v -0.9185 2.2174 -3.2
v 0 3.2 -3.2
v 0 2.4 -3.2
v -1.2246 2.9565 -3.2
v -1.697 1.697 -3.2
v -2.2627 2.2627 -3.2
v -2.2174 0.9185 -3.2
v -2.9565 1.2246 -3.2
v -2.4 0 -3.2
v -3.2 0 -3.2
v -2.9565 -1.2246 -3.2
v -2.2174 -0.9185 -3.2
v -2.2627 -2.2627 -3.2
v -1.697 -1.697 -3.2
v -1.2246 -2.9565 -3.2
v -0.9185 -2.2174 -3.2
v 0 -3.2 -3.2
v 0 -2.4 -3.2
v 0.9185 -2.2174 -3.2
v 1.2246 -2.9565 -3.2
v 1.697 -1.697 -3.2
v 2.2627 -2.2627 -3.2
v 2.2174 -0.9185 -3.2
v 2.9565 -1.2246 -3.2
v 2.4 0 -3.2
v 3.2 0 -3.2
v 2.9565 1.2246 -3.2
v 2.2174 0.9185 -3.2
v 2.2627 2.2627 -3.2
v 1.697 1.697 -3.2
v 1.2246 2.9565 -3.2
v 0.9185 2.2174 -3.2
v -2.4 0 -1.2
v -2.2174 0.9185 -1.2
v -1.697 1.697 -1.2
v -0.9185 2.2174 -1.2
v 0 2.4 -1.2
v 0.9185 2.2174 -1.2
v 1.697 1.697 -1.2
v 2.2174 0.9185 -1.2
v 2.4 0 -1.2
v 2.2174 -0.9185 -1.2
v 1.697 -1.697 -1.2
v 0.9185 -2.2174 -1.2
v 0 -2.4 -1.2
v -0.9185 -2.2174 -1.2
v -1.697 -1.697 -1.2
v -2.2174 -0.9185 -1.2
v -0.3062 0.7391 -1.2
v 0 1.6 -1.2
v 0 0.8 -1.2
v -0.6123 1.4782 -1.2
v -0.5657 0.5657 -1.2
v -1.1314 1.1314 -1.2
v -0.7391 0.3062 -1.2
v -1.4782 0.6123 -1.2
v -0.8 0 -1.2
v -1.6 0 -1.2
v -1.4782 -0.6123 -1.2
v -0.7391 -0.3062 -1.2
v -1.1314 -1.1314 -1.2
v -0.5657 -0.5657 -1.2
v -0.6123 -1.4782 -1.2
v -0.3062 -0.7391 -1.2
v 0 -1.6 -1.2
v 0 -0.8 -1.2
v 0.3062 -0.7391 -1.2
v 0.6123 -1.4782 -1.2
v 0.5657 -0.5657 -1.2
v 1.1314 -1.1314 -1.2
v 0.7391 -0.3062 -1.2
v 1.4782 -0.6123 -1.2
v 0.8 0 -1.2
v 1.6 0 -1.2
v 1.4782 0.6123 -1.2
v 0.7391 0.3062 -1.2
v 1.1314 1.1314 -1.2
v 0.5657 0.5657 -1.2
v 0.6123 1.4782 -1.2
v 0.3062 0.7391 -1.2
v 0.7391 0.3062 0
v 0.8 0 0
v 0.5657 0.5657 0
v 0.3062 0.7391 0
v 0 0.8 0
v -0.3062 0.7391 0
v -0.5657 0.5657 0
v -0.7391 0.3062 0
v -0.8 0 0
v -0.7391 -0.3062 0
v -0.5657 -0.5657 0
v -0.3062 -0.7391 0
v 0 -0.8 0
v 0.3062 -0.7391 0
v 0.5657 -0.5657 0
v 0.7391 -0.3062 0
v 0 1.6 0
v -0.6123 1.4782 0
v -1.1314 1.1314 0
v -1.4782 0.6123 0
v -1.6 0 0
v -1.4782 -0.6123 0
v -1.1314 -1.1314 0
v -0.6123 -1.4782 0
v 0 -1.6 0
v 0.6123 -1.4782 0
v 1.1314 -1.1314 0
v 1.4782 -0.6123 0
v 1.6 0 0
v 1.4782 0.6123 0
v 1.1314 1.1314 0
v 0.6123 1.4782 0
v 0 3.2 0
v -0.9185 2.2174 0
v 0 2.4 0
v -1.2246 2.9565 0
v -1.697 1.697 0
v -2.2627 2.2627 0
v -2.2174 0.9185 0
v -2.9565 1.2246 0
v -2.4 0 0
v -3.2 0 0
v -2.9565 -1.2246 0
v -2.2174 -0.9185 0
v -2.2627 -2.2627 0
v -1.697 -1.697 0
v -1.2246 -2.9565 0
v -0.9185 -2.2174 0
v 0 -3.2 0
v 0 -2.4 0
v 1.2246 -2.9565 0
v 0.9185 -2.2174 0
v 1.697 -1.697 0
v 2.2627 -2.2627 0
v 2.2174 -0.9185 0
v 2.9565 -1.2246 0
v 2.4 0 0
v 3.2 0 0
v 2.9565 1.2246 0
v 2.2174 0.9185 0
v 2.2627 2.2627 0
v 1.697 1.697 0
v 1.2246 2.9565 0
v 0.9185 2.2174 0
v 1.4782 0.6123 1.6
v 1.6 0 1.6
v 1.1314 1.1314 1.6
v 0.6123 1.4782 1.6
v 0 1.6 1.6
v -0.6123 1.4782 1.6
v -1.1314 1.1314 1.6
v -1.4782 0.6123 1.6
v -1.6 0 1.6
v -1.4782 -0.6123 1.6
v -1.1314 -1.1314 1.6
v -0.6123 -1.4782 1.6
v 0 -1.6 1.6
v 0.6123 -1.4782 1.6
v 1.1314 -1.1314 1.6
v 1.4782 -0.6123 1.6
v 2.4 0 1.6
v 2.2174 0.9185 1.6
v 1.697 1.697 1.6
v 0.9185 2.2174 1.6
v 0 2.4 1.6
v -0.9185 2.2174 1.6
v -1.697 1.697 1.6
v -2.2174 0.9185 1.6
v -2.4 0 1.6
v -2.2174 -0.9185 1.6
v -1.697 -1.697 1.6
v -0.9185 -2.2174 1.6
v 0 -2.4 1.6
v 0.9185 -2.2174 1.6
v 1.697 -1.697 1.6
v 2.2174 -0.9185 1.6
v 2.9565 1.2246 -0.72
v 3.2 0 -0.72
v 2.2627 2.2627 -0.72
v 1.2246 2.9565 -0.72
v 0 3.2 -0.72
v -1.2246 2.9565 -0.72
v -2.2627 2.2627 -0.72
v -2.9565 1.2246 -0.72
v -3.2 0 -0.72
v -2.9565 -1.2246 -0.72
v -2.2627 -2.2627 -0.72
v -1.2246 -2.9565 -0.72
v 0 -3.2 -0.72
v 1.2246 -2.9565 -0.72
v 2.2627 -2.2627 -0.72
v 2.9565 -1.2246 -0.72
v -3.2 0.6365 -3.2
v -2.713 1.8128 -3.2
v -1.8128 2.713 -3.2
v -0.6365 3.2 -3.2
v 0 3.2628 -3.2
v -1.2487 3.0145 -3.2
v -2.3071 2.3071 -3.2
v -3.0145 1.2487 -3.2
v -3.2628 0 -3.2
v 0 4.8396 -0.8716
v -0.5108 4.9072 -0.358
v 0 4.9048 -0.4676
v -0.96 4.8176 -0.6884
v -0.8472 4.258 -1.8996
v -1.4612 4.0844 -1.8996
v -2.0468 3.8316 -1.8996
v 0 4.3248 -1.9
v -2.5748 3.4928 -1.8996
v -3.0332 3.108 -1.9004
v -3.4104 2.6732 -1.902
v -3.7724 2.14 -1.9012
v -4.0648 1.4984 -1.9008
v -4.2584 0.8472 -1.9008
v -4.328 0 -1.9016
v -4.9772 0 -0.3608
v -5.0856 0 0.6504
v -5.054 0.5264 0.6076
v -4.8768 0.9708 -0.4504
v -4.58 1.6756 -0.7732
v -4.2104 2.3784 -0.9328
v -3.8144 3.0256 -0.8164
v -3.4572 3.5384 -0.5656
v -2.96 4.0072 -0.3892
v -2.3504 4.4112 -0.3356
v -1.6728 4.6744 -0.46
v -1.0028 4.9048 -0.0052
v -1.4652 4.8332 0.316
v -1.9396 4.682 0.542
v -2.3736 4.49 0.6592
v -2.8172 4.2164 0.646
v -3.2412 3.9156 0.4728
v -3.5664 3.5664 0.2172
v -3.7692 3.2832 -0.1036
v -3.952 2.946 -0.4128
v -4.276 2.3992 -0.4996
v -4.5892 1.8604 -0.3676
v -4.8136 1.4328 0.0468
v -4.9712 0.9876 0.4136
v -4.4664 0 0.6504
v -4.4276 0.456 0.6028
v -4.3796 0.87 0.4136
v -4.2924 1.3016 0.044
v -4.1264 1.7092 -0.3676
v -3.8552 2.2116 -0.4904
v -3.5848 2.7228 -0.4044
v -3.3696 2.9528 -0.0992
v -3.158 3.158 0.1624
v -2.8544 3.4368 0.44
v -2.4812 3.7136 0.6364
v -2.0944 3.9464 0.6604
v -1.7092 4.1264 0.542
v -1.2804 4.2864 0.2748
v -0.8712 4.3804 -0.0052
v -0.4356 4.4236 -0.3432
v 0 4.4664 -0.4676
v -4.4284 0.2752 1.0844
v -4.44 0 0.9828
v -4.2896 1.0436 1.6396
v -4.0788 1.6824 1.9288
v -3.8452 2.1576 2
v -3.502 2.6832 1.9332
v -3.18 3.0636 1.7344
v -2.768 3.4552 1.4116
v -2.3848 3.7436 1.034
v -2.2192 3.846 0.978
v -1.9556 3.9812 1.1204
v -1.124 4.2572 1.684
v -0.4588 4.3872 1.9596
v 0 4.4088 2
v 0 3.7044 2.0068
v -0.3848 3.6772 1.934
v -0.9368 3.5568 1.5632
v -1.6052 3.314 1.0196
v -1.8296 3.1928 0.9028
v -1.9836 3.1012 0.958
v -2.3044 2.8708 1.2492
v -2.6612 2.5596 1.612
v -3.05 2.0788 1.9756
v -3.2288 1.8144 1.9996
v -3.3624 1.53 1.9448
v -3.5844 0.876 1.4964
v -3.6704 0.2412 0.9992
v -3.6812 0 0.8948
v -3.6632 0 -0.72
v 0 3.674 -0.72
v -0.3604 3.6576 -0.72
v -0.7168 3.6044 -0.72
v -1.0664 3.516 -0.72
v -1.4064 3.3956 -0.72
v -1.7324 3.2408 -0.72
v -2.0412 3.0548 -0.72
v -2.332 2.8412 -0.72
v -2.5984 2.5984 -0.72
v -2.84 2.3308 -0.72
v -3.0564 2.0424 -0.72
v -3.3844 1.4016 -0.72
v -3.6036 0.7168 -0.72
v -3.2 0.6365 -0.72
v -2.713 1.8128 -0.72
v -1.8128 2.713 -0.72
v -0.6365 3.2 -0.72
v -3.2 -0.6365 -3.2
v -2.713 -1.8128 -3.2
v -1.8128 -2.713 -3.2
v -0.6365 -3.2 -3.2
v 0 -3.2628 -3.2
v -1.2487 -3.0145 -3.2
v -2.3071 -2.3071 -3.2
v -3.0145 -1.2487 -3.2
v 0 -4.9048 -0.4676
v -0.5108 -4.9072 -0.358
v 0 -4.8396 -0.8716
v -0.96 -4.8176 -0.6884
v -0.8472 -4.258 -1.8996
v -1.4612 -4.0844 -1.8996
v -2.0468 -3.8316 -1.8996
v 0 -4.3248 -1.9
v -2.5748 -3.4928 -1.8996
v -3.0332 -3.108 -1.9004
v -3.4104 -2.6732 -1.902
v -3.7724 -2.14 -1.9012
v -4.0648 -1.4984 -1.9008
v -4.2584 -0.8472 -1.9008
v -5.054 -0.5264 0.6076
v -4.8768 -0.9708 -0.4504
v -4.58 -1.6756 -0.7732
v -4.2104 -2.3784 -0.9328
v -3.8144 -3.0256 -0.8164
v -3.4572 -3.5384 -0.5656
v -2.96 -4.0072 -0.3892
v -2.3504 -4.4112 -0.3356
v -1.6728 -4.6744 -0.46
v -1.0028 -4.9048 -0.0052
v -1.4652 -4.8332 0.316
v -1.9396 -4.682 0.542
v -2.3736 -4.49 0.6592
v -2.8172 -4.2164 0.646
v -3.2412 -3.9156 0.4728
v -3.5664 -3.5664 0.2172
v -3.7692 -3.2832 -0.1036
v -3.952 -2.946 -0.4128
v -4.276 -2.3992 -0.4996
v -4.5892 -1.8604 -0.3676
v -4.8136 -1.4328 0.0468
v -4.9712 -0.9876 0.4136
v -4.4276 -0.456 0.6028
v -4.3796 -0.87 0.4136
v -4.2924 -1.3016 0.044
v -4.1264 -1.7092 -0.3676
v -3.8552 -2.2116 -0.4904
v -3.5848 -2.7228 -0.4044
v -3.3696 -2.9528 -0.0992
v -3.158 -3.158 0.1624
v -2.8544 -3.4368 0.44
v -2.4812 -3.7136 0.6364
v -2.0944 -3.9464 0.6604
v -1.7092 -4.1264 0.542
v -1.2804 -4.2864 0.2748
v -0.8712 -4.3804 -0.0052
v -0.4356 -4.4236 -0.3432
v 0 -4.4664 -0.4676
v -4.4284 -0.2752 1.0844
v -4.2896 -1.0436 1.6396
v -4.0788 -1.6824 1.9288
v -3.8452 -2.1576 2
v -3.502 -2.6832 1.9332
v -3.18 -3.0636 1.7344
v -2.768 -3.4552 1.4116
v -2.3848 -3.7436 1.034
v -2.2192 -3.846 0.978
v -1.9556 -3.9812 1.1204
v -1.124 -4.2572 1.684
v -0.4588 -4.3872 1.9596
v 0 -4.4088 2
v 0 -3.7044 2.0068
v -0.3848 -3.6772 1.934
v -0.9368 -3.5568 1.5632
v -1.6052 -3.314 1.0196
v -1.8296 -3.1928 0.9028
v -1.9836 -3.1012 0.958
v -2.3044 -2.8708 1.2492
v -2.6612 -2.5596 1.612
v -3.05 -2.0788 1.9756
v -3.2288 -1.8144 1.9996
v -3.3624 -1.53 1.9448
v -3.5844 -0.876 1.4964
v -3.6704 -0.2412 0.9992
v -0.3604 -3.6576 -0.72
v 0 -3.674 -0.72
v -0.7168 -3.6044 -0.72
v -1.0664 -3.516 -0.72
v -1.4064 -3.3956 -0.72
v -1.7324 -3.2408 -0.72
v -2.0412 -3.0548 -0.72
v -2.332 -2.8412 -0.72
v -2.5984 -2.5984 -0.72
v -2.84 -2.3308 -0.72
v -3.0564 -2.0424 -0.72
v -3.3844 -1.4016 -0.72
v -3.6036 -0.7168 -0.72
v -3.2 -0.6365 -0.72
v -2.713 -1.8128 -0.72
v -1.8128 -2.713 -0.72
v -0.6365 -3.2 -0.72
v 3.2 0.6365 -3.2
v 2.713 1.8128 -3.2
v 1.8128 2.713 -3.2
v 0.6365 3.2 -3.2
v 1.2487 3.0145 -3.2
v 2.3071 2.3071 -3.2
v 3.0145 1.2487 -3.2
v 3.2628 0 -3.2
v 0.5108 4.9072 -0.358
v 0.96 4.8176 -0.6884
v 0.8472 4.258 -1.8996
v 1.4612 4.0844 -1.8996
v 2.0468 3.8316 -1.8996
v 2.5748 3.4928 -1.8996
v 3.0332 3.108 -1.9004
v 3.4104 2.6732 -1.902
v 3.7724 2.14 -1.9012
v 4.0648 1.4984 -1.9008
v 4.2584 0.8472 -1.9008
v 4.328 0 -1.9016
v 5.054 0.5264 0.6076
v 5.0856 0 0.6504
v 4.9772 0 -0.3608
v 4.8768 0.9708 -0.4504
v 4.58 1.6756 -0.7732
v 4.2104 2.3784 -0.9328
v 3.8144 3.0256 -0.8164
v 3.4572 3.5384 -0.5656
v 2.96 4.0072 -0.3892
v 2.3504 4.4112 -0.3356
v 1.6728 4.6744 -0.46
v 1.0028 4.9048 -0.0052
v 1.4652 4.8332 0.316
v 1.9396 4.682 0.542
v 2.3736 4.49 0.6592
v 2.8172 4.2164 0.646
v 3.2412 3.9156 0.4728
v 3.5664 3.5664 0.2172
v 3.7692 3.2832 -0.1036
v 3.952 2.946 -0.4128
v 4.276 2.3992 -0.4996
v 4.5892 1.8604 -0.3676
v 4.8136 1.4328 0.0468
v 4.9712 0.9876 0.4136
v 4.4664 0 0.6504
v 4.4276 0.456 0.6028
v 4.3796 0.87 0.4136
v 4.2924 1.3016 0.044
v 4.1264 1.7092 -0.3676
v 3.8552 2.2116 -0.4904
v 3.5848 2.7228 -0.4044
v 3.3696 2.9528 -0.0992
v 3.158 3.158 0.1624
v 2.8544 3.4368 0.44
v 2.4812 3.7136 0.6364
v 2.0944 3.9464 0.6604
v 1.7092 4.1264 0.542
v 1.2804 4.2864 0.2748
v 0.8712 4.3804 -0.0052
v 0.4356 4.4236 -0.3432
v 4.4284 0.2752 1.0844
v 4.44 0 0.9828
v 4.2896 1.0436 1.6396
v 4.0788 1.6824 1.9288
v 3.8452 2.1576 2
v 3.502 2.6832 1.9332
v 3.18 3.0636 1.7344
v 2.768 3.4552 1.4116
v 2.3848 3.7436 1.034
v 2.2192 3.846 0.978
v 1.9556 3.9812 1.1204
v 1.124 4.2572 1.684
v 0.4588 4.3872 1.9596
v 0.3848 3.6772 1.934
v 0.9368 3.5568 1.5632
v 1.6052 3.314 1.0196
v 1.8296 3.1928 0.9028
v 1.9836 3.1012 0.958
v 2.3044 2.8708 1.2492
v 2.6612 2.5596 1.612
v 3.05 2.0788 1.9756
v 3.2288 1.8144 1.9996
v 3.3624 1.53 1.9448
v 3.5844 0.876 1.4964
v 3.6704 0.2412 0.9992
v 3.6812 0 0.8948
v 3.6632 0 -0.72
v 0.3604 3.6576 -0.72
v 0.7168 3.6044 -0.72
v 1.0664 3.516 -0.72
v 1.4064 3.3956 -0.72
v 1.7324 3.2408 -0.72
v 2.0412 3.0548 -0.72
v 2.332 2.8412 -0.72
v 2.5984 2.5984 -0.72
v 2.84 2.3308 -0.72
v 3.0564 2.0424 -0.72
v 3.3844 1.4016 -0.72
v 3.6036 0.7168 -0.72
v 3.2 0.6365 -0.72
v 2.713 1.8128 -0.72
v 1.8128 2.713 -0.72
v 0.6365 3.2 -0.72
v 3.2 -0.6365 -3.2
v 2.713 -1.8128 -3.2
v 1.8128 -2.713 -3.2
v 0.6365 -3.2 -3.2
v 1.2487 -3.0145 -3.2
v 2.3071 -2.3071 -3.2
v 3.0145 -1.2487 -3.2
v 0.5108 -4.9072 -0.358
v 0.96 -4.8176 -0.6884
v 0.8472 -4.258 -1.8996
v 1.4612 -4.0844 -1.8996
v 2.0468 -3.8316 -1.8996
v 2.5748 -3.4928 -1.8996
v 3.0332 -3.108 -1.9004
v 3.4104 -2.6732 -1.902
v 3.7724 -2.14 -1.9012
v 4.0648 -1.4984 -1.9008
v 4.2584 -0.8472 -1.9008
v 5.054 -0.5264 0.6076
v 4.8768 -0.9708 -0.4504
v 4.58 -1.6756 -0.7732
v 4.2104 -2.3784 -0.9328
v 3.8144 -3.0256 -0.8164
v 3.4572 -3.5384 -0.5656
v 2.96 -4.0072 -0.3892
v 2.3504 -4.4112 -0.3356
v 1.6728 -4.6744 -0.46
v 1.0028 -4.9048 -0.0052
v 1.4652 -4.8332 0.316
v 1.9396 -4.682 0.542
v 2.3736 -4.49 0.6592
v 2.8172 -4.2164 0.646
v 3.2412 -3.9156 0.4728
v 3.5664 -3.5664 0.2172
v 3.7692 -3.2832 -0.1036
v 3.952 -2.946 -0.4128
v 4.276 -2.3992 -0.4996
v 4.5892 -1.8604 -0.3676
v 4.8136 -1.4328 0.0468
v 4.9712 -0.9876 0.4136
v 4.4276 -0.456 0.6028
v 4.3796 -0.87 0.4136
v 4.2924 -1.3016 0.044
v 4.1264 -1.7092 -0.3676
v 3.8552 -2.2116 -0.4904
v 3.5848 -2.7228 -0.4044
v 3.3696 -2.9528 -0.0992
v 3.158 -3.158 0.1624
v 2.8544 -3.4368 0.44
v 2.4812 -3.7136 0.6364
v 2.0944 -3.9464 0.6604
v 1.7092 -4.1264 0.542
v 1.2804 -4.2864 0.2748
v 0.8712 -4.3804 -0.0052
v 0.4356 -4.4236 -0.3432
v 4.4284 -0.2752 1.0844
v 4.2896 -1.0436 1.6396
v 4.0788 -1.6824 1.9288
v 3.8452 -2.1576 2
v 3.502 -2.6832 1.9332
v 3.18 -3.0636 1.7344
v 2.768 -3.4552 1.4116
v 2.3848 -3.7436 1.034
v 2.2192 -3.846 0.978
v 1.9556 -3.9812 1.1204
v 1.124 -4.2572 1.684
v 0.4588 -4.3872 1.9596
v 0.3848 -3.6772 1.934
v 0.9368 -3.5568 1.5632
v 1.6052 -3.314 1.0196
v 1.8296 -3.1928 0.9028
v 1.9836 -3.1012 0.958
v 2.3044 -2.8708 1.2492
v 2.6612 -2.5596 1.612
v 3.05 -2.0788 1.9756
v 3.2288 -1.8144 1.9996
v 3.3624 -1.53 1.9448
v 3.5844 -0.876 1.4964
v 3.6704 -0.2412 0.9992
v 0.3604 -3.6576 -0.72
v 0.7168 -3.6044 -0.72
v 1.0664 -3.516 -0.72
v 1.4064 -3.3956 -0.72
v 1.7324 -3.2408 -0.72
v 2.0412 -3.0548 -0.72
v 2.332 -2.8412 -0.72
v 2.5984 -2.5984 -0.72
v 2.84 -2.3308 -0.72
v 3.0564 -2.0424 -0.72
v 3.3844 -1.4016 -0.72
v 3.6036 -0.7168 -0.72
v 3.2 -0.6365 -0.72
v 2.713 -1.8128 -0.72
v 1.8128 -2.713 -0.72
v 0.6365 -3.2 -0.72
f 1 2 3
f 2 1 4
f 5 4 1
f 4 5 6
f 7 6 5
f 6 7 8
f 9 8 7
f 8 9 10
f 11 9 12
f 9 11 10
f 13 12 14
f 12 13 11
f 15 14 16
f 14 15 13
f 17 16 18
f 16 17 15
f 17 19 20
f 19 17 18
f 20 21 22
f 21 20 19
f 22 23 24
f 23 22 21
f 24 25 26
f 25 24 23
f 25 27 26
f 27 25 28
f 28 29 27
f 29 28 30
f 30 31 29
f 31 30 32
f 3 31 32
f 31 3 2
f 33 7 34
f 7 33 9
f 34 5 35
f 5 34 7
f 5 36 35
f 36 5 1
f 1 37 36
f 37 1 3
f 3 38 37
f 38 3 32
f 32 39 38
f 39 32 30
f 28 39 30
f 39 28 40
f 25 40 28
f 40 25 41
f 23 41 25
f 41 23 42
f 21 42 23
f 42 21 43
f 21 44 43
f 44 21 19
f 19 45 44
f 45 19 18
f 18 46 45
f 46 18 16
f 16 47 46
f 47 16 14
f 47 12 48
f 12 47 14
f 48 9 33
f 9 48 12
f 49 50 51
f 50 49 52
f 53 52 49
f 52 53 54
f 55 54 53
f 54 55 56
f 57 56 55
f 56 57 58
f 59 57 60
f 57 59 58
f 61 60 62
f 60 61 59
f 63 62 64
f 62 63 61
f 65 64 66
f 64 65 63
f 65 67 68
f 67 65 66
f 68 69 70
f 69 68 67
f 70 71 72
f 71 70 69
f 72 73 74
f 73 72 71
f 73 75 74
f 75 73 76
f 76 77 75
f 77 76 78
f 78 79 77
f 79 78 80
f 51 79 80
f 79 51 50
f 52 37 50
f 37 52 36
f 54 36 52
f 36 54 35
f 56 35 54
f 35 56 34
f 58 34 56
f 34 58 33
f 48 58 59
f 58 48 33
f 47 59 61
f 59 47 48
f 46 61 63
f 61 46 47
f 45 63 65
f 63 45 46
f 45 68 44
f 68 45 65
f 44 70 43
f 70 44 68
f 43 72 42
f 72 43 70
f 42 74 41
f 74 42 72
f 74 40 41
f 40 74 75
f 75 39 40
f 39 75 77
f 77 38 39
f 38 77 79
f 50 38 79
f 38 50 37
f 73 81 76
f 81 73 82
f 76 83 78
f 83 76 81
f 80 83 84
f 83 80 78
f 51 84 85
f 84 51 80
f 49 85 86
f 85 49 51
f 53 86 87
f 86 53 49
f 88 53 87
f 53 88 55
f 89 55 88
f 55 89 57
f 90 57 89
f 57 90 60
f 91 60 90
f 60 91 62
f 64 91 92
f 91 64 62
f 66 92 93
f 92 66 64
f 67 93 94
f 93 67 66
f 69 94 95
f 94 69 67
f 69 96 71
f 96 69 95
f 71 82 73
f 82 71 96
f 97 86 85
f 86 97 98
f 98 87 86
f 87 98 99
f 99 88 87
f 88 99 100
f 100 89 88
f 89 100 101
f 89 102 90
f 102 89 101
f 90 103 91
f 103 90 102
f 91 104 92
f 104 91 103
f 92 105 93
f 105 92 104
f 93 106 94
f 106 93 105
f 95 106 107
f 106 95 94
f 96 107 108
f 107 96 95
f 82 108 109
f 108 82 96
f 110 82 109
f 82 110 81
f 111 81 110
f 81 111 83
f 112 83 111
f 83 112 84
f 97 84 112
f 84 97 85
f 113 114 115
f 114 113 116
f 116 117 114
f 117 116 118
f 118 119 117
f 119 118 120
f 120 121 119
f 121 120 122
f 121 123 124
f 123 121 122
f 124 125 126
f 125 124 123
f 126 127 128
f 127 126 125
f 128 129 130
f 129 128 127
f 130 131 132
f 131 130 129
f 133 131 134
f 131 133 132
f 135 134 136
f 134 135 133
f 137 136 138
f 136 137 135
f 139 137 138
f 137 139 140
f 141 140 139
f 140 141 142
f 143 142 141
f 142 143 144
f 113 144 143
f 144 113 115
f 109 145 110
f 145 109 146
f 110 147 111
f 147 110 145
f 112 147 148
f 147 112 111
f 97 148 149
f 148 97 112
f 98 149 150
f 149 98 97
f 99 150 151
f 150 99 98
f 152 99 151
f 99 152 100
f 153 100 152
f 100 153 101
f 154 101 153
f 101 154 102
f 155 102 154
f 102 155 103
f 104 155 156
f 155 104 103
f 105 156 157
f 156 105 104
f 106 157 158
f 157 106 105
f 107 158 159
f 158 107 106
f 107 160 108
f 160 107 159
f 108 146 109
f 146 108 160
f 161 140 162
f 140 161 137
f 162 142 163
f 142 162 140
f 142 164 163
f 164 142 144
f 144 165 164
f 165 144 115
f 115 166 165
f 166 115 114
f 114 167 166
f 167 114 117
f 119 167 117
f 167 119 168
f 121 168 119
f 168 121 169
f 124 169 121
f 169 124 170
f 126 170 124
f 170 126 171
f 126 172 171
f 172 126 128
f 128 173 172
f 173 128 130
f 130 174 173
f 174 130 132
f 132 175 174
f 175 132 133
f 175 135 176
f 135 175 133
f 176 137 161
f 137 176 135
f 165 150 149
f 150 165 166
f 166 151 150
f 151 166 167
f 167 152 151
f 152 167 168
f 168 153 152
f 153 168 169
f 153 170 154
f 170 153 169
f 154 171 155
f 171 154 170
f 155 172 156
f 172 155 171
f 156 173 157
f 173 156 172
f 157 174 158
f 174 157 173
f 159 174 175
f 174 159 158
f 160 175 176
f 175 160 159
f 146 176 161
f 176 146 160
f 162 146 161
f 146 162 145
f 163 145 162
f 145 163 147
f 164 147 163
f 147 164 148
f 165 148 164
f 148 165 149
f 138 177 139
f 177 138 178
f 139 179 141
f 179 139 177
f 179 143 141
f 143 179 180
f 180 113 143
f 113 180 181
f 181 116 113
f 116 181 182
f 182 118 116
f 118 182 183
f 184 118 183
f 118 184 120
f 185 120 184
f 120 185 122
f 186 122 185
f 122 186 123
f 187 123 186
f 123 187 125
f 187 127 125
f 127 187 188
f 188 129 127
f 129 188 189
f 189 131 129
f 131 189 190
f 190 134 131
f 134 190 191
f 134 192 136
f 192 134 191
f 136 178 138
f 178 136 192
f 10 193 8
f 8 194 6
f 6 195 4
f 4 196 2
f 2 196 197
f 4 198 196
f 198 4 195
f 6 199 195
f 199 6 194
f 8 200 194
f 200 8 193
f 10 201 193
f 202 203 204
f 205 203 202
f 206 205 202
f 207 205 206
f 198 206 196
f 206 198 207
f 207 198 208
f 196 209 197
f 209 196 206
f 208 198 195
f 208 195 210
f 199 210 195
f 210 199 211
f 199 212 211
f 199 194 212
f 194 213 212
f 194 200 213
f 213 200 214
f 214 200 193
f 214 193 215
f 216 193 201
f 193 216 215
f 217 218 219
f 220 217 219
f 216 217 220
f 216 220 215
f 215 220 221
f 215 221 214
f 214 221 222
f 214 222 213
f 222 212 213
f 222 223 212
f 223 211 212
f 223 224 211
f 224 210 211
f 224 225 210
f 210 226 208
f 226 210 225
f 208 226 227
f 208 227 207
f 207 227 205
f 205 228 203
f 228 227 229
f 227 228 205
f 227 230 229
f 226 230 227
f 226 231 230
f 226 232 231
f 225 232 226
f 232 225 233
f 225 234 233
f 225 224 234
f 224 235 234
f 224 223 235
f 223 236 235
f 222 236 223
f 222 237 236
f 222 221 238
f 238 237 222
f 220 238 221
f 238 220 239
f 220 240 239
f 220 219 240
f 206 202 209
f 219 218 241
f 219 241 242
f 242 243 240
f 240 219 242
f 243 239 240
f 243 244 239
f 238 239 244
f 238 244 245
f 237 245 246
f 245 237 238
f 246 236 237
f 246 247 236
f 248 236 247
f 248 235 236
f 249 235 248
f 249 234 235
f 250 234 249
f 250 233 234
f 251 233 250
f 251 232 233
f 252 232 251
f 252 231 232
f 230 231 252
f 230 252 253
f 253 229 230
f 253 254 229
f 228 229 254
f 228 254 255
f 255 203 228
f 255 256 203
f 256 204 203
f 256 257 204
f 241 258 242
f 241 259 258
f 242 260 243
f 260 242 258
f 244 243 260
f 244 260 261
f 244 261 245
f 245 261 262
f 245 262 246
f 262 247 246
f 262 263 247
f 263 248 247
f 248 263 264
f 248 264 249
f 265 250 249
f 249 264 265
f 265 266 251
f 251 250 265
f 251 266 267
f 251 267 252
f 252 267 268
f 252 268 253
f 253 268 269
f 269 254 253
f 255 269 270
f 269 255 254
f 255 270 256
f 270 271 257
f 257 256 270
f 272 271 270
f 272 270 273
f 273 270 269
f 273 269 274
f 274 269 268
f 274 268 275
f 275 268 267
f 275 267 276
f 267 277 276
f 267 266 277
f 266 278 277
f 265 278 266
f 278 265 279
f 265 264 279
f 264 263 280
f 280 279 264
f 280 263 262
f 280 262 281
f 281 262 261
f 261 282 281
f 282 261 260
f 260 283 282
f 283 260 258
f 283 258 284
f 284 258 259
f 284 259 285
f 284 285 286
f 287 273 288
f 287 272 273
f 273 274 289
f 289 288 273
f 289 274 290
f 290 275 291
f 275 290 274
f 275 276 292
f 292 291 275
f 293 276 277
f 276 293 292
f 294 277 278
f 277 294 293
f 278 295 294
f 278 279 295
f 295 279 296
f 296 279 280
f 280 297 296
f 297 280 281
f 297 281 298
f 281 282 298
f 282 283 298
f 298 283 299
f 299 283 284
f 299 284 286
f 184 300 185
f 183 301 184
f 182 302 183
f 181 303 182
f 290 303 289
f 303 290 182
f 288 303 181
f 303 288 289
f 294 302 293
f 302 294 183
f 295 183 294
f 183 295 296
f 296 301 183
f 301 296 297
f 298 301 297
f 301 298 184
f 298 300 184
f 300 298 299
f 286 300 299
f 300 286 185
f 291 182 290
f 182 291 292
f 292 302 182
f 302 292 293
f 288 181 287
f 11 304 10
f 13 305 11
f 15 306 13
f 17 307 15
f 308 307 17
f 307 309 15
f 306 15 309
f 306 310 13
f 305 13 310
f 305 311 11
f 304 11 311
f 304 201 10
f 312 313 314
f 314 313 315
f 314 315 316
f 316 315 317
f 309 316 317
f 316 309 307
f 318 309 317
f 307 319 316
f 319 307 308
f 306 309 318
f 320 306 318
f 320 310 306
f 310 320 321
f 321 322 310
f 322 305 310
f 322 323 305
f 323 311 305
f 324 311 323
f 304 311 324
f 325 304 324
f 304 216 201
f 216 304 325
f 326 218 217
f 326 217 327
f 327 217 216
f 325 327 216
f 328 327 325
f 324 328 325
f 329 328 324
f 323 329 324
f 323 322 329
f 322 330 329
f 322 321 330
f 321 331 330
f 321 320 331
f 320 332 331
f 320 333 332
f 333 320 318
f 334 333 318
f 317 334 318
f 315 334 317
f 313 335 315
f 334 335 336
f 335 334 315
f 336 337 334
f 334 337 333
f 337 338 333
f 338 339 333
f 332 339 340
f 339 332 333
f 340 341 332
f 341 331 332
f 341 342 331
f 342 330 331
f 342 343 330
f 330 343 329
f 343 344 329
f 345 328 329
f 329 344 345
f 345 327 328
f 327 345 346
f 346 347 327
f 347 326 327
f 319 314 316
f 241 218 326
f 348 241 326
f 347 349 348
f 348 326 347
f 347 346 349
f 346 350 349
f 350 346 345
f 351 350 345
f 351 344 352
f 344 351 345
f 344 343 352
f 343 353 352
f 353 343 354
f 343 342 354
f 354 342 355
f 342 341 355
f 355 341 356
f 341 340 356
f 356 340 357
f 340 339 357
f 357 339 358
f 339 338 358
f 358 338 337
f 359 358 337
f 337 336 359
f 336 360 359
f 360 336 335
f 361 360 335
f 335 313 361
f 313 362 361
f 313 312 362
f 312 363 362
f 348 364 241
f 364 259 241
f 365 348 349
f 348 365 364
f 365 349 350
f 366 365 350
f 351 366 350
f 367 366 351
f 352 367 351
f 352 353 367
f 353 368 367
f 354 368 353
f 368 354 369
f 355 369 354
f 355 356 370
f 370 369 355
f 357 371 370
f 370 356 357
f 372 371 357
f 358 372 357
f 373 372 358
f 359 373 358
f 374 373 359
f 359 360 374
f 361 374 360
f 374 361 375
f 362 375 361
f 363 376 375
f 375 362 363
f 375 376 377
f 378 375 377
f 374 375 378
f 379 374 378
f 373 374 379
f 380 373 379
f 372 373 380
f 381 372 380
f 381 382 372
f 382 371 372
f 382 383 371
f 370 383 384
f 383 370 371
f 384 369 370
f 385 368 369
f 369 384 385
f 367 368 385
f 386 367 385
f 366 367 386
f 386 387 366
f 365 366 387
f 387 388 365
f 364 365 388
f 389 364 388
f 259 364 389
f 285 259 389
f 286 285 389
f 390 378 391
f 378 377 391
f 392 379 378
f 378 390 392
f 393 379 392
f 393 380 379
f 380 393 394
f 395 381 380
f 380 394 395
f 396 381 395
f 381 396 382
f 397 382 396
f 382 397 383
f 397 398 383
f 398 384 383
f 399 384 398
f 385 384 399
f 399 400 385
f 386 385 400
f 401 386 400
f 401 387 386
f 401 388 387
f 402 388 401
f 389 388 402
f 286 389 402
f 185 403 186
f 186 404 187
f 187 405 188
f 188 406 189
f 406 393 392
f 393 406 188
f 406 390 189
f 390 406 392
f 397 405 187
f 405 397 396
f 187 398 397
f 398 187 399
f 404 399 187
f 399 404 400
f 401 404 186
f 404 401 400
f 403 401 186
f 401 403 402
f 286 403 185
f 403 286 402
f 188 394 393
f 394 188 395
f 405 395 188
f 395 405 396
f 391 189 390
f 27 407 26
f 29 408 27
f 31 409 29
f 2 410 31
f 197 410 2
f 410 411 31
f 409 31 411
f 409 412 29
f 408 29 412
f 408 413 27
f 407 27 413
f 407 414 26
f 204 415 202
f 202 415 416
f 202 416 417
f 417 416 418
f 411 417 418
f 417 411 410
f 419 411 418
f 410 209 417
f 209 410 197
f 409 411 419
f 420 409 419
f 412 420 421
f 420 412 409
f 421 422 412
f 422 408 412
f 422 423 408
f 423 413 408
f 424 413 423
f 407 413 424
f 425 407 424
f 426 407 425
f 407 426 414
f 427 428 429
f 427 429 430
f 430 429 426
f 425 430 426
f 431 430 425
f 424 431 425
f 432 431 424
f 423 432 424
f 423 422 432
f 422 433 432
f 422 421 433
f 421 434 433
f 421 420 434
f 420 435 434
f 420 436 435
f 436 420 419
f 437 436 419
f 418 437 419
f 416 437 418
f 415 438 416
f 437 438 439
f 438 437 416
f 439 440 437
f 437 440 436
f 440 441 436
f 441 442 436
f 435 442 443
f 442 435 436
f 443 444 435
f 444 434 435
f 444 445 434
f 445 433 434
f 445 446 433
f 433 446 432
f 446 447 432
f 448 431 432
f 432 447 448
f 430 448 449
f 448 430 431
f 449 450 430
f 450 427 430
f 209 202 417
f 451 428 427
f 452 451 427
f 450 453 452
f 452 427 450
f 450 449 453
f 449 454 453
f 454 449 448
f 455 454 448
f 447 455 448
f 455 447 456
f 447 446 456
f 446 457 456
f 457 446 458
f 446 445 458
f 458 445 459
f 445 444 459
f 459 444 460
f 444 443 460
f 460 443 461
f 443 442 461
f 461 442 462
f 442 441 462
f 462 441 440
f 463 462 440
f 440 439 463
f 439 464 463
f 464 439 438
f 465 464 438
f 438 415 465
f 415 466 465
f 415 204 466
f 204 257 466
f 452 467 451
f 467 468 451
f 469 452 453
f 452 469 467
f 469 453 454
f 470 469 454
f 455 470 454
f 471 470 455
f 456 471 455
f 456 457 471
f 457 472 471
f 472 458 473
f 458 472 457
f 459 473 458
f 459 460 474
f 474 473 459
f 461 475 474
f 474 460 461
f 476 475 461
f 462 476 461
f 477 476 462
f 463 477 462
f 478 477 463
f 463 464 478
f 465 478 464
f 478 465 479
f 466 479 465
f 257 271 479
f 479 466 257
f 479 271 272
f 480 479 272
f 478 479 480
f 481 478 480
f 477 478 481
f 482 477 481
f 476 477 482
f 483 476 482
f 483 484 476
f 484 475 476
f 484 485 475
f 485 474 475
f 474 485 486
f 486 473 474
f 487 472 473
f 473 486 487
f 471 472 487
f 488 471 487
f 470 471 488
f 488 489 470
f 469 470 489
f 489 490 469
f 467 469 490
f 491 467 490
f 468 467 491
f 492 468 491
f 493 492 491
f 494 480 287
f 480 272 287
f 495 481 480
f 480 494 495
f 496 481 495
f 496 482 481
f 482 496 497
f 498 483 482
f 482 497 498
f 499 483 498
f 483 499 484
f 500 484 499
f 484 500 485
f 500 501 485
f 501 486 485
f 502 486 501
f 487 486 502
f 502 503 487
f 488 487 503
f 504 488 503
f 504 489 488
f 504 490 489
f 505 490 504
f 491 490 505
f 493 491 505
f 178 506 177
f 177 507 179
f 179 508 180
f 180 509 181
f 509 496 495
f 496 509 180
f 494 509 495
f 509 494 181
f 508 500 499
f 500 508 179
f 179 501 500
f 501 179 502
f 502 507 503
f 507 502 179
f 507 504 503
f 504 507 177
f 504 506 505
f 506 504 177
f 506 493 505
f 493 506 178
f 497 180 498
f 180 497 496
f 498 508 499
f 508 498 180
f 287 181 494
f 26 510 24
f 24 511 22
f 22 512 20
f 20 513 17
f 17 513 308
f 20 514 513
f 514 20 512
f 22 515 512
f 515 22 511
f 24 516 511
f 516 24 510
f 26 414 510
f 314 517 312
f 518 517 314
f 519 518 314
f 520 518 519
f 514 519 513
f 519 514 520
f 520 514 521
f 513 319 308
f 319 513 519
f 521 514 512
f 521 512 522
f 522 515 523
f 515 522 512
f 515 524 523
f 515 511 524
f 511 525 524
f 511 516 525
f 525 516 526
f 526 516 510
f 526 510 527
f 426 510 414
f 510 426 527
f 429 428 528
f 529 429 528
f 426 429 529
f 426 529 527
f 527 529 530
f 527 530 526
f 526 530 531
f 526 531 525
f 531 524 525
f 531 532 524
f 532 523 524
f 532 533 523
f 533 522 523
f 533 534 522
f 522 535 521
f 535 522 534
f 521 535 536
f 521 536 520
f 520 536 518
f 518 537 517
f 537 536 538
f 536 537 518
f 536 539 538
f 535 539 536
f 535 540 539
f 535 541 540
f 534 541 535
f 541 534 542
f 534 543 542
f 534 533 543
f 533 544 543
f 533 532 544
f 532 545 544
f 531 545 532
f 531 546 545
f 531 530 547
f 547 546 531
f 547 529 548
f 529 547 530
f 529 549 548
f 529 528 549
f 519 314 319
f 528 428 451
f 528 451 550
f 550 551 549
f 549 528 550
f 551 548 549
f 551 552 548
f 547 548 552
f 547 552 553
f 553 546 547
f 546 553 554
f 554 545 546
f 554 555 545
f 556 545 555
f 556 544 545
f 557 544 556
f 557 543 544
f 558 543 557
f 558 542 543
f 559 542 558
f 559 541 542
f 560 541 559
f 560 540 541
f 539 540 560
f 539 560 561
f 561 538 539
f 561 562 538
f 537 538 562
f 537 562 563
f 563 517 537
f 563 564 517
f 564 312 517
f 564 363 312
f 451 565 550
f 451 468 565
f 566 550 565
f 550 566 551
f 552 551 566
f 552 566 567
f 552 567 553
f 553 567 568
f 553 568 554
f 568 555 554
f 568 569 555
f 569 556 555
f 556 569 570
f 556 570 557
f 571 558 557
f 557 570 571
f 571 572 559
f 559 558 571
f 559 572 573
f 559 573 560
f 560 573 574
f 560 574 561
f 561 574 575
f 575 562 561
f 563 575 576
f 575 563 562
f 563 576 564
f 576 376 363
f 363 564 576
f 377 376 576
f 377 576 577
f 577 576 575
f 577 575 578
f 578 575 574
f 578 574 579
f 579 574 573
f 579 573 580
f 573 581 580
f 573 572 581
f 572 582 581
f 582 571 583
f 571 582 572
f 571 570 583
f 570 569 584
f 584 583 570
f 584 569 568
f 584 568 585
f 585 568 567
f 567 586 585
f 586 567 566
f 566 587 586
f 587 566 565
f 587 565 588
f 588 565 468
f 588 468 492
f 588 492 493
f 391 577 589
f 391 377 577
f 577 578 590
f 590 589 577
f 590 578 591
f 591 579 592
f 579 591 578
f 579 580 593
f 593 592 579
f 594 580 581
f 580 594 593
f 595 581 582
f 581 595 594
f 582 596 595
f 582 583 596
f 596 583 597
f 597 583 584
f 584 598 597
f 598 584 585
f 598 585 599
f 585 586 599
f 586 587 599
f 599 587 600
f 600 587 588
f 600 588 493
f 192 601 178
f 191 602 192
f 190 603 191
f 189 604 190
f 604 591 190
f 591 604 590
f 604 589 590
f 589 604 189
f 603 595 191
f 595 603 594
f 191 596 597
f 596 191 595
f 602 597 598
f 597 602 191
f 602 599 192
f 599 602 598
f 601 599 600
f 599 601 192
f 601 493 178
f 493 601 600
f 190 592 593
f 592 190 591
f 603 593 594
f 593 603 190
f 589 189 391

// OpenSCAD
use <../lib.scad>
use <../p/4-4cylo.scad>
use <../p/4-4edge.scad>
use <../p/4-4ring1.scad>
use <../p/4-4ring2.scad>
use <../p/4-4ring3.scad>
use <s/5904s01.scad>
use <../p/stud2a.scad>
use <../p/stud4od.scad>
function ldraw_lib__5904() = [
// 0 Plate  1 x  1 with 12 Petals
// 0 Name: 5904.dat
// 0 Author: Gerald Lasser [GeraldLasser]
// 0 !LDRAW_ORG Part UPDATE 2024-09
// 0 !LICENSE Licensed under CC BY 4.0 : see CAreadme.txt
// 
// 0 BFC CERTIFY CCW
  [0,"BFC","CERTIFY"],
  [0,"BFC","CCW"],
// 
// 0 !KEYWORDS Botanical, Flower, Plant, Rose
// 
// 0 !HISTORY 2024-10-01 {LEGO Instructions App} Original part shape
// 0 !HISTORY 2024-10-01 [GeraldLasser] File preparation for LDraw Parts Tracker
// 0 !HISTORY 2024-10-27 [OrionP] Official Update 2024-09
// 
// 1 16 0 3 0 1 0 0 0 -1.25 0 0 0 1 stud4od.dat
  [1,16,0,3,0,1,0,0,0,-1.25,0,0,0,1, ldraw_lib__stud4od()],
// 1 16 0 3 0 2 0 0 0 -1 0 0 0 2 4-4ring1.dat
  [1,16,0,3,0,2,0,0,0,-1,0,0,0,2, ldraw_lib__4_4ring1()],
// 1 16 0 3 0 2 0 0 0 -1 0 0 0 2 4-4ring2.dat
  [1,16,0,3,0,2,0,0,0,-1,0,0,0,2, ldraw_lib__4_4ring2()],
// 0 BFC INVERTNEXT
  [0,"BFC","INVERTNEXT"],
// 1 16 0 3 0 2 0 0 0 -3 0 0 0 2 4-4cylo.dat
  [1,16,0,3,0,2,0,0,0,-3,0,0,0,2, ldraw_lib__4_4cylo()],
// 1 16 0 0 0 2 0 0 0 1 0 0 0 2 4-4ring1.dat
  [1,16,0,0,0,2,0,0,0,1,0,0,0,2, ldraw_lib__4_4ring1()],
// 1 16 0 0 0 4 0 0 0 1 0 0 0 4 4-4edge.dat
  [1,16,0,0,0,4,0,0,0,1,0,0,0,4, ldraw_lib__4_4edge()],
// 1 16 0 0 0 6 0 0 0 1 0 0 0 6 4-4edge.dat
  [1,16,0,0,0,6,0,0,0,1,0,0,0,6, ldraw_lib__4_4edge()],
// 1 16 0 0 0 2 0 0 0 1 0 0 0 2 4-4ring3.dat
  [1,16,0,0,0,2,0,0,0,1,0,0,0,2, ldraw_lib__4_4ring3()],
// 1 16 0 0 0 1 0 0 0 1 0 0 0 1 stud2a.dat
  [1,16,0,0,0,1,0,0,0,1,0,0,0,1, ldraw_lib__stud2a()],
// 1 16 0 0 0 8 0 0 0 1.8 0 0 0 8 4-4cylo.dat
  [1,16,0,0,0,8,0,0,0,1.8,0,0,0,8, ldraw_lib__4_4cylo()],
// 
// 1 16 0 0 0 1 0 0 0 1 0 0 0 1 s\5904s01.dat
  [1,16,0,0,0,1,0,0,0,1,0,0,0,1, ldraw_lib__s__5904s01()],
// 1 16 0 0 0 1 0 0 0 1 0 0 0 -1 s\5904s01.dat
  [1,16,0,0,0,1,0,0,0,1,0,0,0,-1, ldraw_lib__s__5904s01()],
// 1 16 0 0 0 -1 0 0 0 1 0 0 0 1 s\5904s01.dat
  [1,16,0,0,0,-1,0,0,0,1,0,0,0,1, ldraw_lib__s__5904s01()],
// 1 16 0 0 0 -1 0 0 0 1 0 0 0 -1 s\5904s01.dat
  [1,16,0,0,0,-1,0,0,0,1,0,0,0,-1, ldraw_lib__s__5904s01()],
// 
// 5 24 -9.203 -2.237 0 -9.158 1.8 0 -9.176 -2.498 .603 -9.176 -2.498 -.603
  [5,24,-9.203,-2.237,0,-9.158,1.8,0,-9.176,-2.498,.603,-9.176,-2.498,-.603],
// 5 24 0 2.179 -12.099 0 4.75 -10.812 2.118 4.749 -10.645 -2.118 4.749 -10.645
  [5,24,0,2.179,-12.099,0,4.75,-10.812,2.118,4.749,-10.645,-2.118,4.749,-10.645],
// 5 24 0 2.179 12.099 0 4.75 10.812 2.118 4.749 10.645 -2.118 4.749 10.645
  [5,24,0,2.179,12.099,0,4.75,10.812,2.118,4.749,10.645,-2.118,4.749,10.645],
// 5 24 10.82 4.754 0 12.443 .902 0 12.192 1.126 -2.427 12.192 1.126 2.427
  [5,24,10.82,4.754,0,12.443,.902,0,12.192,1.126,-2.427,12.192,1.126,2.427],
// 5 24 12.714 -1.626 0 11.166 -1.626 0 12.635 -1.519 -1.316 12.635 -1.519 1.316
  [5,24,12.714,-1.626,0,11.166,-1.626,0,12.635,-1.519,-1.316,12.635,-1.519,1.316],
// 5 24 9.203 -2.237 0 9.158 1.8 0 9.176 -2.498 .603 9.176 -2.498 -.603
  [5,24,9.203,-2.237,0,9.158,1.8,0,9.176,-2.498,.603,9.176,-2.498,-.603],
// 5 24 12.443 .902 0 12.714 -1.626 0 12.635 -1.519 -1.316 12.635 -1.519 1.316
  [5,24,12.443,.902,0,12.714,-1.626,0,12.635,-1.519,-1.316,12.635,-1.519,1.316],
// 5 24 -12.443 .902 0 -12.714 -1.626 0 -12.635 -1.519 -1.316 -12.635 -1.519 1.316
  [5,24,-12.443,.902,0,-12.714,-1.626,0,-12.635,-1.519,-1.316,-12.635,-1.519,1.316],
// 5 24 0 -5 -11.022 0 1.169 -11.166 1.147 -4.899 -10.968 -1.147 -4.899 -10.968
  [5,24,0,-5,-11.022,0,1.169,-11.166,1.147,-4.899,-10.968,-1.147,-4.899,-10.968],
// 5 24 0 -5.017 -9.261 0 -5 -11.022 1.147 -4.899 -10.968 -1.147 -4.899 -10.968
  [5,24,0,-5.017,-9.261,0,-5,-11.022,1.147,-4.899,-10.968,-1.147,-4.899,-10.968],
// 5 24 0 1.169 -12.262 0 2.179 -12.099 -1.277 .895 -12.268 1.277 .895 -12.268
  [5,24,0,1.169,-12.262,0,2.179,-12.099,-1.277,.895,-12.268,1.277,.895,-12.268],
// 5 24 11.1 -2.457 0 9.203 -2.237 0 9.176 -2.498 -.603 9.176 -2.498 .603
  [5,24,11.1,-2.457,0,9.203,-2.237,0,9.176,-2.498,-.603,9.176,-2.498,.603],
// 5 24 -11.166 -1.626 0 -11.1 -2.457 0 -11.071 -2.711 -.688 -11.071 -2.711 .688
  [5,24,-11.166,-1.626,0,-11.1,-2.457,0,-11.071,-2.711,-.688,-11.071,-2.711,.688],
// 5 24 0 4.75 -10.812 0 8 -8.157 -1.5912 8 -8 1.5912 8 -8
  [5,24,0,4.75,-10.812,0,8,-8.157,-1.5912,8,-8,1.5912,8,-8],
// 5 24 0 1.8 9.185 0 -5.017 9.261 -.962 -4.835 9.193 .962 -4.835 9.193
  [5,24,0,1.8,9.185,0,-5.017,9.261,-.962,-4.835,9.193,.962,-4.835,9.193],
// 5 24 11.166 -1.626 0 11.1 -2.457 0 11.071 -2.711 -.688 11.071 -2.711 .688
  [5,24,11.166,-1.626,0,11.1,-2.457,0,11.071,-2.711,-.688,11.071,-2.711,.688],
// 5 24 -12.714 -1.626 0 -11.166 -1.626 0 -12.635 -1.519 1.316 -12.635 -1.519 -1.316
  [5,24,-12.714,-1.626,0,-11.166,-1.626,0,-12.635,-1.519,1.316,-12.635,-1.519,-1.316],
// 5 24 -8.157 8 0 -10.82 4.754 0 -10.646 4.752 -2.118 -10.646 4.752 2.118
  [5,24,-8.157,8,0,-10.82,4.754,0,-10.646,4.752,-2.118,-10.646,4.752,2.118],
// 5 24 0 1.8 -9.185 0 -5.017 -9.261 -.962 -4.835 -9.193 .962 -4.835 -9.193
  [5,24,0,1.8,-9.185,0,-5.017,-9.261,-.962,-4.835,-9.193,.962,-4.835,-9.193],
// 5 24 0 1.169 -11.166 0 1.169 -12.262 1.089 .858 -11.059 -1.089 .858 -11.059
  [5,24,0,1.169,-11.166,0,1.169,-12.262,1.089,.858,-11.059,-1.089,.858,-11.059],
// 5 24 0 4.75 10.812 0 8 8.157 -1.5912 8 8 1.5912 8 8
  [5,24,0,4.75,10.812,0,8,8.157,-1.5912,8,8,1.5912,8,8],
// 5 24 -11.1 -2.457 0 -9.203 -2.237 0 -9.176 -2.498 -.603 -9.176 -2.498 .603
  [5,24,-11.1,-2.457,0,-9.203,-2.237,0,-9.176,-2.498,-.603,-9.176,-2.498,.603],
// 5 24 -10.82 4.754 0 -12.443 .902 0 -12.192 1.126 -2.427 -12.192 1.126 2.427
  [5,24,-10.82,4.754,0,-12.443,.902,0,-12.192,1.126,-2.427,-12.192,1.126,2.427],
// 5 24 0 1.169 11.166 0 1.169 12.262 1.089 .858 11.059 -1.089 .858 11.059
  [5,24,0,1.169,11.166,0,1.169,12.262,1.089,.858,11.059,-1.089,.858,11.059],
// 5 24 8.157 8 0 10.82 4.754 0 10.646 4.752 2.118 10.646 4.752 -2.118
  [5,24,8.157,8,0,10.82,4.754,0,10.646,4.752,2.118,10.646,4.752,-2.118],
// 5 24 0 -5 11.022 0 1.169 11.166 -1.147 -4.899 10.968 1.147 -4.899 10.968
  [5,24,0,-5,11.022,0,1.169,11.166,-1.147,-4.899,10.968,1.147,-4.899,10.968],
// 5 24 0 1.169 12.262 0 2.179 12.099 1.277 .895 12.268 -1.277 .895 12.268
  [5,24,0,1.169,12.262,0,2.179,12.099,1.277,.895,12.268,-1.277,.895,12.268],
// 5 24 0 -5.017 9.261 0 -5 11.022 1.147 -4.899 10.968 -1.147 -4.899 10.968
  [5,24,0,-5.017,9.261,0,-5,11.022,1.147,-4.899,10.968,-1.147,-4.899,10.968],
];
module ldraw_lib__5904(step=0, col=false, unit=2/5, alt=false, line=0.2, solid=!$preview)
    makepoly(ldraw_lib__5904(), step=step, col=col, unit=unit, alt=alt, line=line, solid=solid);
ldraw_lib__5904(line=0.2);
